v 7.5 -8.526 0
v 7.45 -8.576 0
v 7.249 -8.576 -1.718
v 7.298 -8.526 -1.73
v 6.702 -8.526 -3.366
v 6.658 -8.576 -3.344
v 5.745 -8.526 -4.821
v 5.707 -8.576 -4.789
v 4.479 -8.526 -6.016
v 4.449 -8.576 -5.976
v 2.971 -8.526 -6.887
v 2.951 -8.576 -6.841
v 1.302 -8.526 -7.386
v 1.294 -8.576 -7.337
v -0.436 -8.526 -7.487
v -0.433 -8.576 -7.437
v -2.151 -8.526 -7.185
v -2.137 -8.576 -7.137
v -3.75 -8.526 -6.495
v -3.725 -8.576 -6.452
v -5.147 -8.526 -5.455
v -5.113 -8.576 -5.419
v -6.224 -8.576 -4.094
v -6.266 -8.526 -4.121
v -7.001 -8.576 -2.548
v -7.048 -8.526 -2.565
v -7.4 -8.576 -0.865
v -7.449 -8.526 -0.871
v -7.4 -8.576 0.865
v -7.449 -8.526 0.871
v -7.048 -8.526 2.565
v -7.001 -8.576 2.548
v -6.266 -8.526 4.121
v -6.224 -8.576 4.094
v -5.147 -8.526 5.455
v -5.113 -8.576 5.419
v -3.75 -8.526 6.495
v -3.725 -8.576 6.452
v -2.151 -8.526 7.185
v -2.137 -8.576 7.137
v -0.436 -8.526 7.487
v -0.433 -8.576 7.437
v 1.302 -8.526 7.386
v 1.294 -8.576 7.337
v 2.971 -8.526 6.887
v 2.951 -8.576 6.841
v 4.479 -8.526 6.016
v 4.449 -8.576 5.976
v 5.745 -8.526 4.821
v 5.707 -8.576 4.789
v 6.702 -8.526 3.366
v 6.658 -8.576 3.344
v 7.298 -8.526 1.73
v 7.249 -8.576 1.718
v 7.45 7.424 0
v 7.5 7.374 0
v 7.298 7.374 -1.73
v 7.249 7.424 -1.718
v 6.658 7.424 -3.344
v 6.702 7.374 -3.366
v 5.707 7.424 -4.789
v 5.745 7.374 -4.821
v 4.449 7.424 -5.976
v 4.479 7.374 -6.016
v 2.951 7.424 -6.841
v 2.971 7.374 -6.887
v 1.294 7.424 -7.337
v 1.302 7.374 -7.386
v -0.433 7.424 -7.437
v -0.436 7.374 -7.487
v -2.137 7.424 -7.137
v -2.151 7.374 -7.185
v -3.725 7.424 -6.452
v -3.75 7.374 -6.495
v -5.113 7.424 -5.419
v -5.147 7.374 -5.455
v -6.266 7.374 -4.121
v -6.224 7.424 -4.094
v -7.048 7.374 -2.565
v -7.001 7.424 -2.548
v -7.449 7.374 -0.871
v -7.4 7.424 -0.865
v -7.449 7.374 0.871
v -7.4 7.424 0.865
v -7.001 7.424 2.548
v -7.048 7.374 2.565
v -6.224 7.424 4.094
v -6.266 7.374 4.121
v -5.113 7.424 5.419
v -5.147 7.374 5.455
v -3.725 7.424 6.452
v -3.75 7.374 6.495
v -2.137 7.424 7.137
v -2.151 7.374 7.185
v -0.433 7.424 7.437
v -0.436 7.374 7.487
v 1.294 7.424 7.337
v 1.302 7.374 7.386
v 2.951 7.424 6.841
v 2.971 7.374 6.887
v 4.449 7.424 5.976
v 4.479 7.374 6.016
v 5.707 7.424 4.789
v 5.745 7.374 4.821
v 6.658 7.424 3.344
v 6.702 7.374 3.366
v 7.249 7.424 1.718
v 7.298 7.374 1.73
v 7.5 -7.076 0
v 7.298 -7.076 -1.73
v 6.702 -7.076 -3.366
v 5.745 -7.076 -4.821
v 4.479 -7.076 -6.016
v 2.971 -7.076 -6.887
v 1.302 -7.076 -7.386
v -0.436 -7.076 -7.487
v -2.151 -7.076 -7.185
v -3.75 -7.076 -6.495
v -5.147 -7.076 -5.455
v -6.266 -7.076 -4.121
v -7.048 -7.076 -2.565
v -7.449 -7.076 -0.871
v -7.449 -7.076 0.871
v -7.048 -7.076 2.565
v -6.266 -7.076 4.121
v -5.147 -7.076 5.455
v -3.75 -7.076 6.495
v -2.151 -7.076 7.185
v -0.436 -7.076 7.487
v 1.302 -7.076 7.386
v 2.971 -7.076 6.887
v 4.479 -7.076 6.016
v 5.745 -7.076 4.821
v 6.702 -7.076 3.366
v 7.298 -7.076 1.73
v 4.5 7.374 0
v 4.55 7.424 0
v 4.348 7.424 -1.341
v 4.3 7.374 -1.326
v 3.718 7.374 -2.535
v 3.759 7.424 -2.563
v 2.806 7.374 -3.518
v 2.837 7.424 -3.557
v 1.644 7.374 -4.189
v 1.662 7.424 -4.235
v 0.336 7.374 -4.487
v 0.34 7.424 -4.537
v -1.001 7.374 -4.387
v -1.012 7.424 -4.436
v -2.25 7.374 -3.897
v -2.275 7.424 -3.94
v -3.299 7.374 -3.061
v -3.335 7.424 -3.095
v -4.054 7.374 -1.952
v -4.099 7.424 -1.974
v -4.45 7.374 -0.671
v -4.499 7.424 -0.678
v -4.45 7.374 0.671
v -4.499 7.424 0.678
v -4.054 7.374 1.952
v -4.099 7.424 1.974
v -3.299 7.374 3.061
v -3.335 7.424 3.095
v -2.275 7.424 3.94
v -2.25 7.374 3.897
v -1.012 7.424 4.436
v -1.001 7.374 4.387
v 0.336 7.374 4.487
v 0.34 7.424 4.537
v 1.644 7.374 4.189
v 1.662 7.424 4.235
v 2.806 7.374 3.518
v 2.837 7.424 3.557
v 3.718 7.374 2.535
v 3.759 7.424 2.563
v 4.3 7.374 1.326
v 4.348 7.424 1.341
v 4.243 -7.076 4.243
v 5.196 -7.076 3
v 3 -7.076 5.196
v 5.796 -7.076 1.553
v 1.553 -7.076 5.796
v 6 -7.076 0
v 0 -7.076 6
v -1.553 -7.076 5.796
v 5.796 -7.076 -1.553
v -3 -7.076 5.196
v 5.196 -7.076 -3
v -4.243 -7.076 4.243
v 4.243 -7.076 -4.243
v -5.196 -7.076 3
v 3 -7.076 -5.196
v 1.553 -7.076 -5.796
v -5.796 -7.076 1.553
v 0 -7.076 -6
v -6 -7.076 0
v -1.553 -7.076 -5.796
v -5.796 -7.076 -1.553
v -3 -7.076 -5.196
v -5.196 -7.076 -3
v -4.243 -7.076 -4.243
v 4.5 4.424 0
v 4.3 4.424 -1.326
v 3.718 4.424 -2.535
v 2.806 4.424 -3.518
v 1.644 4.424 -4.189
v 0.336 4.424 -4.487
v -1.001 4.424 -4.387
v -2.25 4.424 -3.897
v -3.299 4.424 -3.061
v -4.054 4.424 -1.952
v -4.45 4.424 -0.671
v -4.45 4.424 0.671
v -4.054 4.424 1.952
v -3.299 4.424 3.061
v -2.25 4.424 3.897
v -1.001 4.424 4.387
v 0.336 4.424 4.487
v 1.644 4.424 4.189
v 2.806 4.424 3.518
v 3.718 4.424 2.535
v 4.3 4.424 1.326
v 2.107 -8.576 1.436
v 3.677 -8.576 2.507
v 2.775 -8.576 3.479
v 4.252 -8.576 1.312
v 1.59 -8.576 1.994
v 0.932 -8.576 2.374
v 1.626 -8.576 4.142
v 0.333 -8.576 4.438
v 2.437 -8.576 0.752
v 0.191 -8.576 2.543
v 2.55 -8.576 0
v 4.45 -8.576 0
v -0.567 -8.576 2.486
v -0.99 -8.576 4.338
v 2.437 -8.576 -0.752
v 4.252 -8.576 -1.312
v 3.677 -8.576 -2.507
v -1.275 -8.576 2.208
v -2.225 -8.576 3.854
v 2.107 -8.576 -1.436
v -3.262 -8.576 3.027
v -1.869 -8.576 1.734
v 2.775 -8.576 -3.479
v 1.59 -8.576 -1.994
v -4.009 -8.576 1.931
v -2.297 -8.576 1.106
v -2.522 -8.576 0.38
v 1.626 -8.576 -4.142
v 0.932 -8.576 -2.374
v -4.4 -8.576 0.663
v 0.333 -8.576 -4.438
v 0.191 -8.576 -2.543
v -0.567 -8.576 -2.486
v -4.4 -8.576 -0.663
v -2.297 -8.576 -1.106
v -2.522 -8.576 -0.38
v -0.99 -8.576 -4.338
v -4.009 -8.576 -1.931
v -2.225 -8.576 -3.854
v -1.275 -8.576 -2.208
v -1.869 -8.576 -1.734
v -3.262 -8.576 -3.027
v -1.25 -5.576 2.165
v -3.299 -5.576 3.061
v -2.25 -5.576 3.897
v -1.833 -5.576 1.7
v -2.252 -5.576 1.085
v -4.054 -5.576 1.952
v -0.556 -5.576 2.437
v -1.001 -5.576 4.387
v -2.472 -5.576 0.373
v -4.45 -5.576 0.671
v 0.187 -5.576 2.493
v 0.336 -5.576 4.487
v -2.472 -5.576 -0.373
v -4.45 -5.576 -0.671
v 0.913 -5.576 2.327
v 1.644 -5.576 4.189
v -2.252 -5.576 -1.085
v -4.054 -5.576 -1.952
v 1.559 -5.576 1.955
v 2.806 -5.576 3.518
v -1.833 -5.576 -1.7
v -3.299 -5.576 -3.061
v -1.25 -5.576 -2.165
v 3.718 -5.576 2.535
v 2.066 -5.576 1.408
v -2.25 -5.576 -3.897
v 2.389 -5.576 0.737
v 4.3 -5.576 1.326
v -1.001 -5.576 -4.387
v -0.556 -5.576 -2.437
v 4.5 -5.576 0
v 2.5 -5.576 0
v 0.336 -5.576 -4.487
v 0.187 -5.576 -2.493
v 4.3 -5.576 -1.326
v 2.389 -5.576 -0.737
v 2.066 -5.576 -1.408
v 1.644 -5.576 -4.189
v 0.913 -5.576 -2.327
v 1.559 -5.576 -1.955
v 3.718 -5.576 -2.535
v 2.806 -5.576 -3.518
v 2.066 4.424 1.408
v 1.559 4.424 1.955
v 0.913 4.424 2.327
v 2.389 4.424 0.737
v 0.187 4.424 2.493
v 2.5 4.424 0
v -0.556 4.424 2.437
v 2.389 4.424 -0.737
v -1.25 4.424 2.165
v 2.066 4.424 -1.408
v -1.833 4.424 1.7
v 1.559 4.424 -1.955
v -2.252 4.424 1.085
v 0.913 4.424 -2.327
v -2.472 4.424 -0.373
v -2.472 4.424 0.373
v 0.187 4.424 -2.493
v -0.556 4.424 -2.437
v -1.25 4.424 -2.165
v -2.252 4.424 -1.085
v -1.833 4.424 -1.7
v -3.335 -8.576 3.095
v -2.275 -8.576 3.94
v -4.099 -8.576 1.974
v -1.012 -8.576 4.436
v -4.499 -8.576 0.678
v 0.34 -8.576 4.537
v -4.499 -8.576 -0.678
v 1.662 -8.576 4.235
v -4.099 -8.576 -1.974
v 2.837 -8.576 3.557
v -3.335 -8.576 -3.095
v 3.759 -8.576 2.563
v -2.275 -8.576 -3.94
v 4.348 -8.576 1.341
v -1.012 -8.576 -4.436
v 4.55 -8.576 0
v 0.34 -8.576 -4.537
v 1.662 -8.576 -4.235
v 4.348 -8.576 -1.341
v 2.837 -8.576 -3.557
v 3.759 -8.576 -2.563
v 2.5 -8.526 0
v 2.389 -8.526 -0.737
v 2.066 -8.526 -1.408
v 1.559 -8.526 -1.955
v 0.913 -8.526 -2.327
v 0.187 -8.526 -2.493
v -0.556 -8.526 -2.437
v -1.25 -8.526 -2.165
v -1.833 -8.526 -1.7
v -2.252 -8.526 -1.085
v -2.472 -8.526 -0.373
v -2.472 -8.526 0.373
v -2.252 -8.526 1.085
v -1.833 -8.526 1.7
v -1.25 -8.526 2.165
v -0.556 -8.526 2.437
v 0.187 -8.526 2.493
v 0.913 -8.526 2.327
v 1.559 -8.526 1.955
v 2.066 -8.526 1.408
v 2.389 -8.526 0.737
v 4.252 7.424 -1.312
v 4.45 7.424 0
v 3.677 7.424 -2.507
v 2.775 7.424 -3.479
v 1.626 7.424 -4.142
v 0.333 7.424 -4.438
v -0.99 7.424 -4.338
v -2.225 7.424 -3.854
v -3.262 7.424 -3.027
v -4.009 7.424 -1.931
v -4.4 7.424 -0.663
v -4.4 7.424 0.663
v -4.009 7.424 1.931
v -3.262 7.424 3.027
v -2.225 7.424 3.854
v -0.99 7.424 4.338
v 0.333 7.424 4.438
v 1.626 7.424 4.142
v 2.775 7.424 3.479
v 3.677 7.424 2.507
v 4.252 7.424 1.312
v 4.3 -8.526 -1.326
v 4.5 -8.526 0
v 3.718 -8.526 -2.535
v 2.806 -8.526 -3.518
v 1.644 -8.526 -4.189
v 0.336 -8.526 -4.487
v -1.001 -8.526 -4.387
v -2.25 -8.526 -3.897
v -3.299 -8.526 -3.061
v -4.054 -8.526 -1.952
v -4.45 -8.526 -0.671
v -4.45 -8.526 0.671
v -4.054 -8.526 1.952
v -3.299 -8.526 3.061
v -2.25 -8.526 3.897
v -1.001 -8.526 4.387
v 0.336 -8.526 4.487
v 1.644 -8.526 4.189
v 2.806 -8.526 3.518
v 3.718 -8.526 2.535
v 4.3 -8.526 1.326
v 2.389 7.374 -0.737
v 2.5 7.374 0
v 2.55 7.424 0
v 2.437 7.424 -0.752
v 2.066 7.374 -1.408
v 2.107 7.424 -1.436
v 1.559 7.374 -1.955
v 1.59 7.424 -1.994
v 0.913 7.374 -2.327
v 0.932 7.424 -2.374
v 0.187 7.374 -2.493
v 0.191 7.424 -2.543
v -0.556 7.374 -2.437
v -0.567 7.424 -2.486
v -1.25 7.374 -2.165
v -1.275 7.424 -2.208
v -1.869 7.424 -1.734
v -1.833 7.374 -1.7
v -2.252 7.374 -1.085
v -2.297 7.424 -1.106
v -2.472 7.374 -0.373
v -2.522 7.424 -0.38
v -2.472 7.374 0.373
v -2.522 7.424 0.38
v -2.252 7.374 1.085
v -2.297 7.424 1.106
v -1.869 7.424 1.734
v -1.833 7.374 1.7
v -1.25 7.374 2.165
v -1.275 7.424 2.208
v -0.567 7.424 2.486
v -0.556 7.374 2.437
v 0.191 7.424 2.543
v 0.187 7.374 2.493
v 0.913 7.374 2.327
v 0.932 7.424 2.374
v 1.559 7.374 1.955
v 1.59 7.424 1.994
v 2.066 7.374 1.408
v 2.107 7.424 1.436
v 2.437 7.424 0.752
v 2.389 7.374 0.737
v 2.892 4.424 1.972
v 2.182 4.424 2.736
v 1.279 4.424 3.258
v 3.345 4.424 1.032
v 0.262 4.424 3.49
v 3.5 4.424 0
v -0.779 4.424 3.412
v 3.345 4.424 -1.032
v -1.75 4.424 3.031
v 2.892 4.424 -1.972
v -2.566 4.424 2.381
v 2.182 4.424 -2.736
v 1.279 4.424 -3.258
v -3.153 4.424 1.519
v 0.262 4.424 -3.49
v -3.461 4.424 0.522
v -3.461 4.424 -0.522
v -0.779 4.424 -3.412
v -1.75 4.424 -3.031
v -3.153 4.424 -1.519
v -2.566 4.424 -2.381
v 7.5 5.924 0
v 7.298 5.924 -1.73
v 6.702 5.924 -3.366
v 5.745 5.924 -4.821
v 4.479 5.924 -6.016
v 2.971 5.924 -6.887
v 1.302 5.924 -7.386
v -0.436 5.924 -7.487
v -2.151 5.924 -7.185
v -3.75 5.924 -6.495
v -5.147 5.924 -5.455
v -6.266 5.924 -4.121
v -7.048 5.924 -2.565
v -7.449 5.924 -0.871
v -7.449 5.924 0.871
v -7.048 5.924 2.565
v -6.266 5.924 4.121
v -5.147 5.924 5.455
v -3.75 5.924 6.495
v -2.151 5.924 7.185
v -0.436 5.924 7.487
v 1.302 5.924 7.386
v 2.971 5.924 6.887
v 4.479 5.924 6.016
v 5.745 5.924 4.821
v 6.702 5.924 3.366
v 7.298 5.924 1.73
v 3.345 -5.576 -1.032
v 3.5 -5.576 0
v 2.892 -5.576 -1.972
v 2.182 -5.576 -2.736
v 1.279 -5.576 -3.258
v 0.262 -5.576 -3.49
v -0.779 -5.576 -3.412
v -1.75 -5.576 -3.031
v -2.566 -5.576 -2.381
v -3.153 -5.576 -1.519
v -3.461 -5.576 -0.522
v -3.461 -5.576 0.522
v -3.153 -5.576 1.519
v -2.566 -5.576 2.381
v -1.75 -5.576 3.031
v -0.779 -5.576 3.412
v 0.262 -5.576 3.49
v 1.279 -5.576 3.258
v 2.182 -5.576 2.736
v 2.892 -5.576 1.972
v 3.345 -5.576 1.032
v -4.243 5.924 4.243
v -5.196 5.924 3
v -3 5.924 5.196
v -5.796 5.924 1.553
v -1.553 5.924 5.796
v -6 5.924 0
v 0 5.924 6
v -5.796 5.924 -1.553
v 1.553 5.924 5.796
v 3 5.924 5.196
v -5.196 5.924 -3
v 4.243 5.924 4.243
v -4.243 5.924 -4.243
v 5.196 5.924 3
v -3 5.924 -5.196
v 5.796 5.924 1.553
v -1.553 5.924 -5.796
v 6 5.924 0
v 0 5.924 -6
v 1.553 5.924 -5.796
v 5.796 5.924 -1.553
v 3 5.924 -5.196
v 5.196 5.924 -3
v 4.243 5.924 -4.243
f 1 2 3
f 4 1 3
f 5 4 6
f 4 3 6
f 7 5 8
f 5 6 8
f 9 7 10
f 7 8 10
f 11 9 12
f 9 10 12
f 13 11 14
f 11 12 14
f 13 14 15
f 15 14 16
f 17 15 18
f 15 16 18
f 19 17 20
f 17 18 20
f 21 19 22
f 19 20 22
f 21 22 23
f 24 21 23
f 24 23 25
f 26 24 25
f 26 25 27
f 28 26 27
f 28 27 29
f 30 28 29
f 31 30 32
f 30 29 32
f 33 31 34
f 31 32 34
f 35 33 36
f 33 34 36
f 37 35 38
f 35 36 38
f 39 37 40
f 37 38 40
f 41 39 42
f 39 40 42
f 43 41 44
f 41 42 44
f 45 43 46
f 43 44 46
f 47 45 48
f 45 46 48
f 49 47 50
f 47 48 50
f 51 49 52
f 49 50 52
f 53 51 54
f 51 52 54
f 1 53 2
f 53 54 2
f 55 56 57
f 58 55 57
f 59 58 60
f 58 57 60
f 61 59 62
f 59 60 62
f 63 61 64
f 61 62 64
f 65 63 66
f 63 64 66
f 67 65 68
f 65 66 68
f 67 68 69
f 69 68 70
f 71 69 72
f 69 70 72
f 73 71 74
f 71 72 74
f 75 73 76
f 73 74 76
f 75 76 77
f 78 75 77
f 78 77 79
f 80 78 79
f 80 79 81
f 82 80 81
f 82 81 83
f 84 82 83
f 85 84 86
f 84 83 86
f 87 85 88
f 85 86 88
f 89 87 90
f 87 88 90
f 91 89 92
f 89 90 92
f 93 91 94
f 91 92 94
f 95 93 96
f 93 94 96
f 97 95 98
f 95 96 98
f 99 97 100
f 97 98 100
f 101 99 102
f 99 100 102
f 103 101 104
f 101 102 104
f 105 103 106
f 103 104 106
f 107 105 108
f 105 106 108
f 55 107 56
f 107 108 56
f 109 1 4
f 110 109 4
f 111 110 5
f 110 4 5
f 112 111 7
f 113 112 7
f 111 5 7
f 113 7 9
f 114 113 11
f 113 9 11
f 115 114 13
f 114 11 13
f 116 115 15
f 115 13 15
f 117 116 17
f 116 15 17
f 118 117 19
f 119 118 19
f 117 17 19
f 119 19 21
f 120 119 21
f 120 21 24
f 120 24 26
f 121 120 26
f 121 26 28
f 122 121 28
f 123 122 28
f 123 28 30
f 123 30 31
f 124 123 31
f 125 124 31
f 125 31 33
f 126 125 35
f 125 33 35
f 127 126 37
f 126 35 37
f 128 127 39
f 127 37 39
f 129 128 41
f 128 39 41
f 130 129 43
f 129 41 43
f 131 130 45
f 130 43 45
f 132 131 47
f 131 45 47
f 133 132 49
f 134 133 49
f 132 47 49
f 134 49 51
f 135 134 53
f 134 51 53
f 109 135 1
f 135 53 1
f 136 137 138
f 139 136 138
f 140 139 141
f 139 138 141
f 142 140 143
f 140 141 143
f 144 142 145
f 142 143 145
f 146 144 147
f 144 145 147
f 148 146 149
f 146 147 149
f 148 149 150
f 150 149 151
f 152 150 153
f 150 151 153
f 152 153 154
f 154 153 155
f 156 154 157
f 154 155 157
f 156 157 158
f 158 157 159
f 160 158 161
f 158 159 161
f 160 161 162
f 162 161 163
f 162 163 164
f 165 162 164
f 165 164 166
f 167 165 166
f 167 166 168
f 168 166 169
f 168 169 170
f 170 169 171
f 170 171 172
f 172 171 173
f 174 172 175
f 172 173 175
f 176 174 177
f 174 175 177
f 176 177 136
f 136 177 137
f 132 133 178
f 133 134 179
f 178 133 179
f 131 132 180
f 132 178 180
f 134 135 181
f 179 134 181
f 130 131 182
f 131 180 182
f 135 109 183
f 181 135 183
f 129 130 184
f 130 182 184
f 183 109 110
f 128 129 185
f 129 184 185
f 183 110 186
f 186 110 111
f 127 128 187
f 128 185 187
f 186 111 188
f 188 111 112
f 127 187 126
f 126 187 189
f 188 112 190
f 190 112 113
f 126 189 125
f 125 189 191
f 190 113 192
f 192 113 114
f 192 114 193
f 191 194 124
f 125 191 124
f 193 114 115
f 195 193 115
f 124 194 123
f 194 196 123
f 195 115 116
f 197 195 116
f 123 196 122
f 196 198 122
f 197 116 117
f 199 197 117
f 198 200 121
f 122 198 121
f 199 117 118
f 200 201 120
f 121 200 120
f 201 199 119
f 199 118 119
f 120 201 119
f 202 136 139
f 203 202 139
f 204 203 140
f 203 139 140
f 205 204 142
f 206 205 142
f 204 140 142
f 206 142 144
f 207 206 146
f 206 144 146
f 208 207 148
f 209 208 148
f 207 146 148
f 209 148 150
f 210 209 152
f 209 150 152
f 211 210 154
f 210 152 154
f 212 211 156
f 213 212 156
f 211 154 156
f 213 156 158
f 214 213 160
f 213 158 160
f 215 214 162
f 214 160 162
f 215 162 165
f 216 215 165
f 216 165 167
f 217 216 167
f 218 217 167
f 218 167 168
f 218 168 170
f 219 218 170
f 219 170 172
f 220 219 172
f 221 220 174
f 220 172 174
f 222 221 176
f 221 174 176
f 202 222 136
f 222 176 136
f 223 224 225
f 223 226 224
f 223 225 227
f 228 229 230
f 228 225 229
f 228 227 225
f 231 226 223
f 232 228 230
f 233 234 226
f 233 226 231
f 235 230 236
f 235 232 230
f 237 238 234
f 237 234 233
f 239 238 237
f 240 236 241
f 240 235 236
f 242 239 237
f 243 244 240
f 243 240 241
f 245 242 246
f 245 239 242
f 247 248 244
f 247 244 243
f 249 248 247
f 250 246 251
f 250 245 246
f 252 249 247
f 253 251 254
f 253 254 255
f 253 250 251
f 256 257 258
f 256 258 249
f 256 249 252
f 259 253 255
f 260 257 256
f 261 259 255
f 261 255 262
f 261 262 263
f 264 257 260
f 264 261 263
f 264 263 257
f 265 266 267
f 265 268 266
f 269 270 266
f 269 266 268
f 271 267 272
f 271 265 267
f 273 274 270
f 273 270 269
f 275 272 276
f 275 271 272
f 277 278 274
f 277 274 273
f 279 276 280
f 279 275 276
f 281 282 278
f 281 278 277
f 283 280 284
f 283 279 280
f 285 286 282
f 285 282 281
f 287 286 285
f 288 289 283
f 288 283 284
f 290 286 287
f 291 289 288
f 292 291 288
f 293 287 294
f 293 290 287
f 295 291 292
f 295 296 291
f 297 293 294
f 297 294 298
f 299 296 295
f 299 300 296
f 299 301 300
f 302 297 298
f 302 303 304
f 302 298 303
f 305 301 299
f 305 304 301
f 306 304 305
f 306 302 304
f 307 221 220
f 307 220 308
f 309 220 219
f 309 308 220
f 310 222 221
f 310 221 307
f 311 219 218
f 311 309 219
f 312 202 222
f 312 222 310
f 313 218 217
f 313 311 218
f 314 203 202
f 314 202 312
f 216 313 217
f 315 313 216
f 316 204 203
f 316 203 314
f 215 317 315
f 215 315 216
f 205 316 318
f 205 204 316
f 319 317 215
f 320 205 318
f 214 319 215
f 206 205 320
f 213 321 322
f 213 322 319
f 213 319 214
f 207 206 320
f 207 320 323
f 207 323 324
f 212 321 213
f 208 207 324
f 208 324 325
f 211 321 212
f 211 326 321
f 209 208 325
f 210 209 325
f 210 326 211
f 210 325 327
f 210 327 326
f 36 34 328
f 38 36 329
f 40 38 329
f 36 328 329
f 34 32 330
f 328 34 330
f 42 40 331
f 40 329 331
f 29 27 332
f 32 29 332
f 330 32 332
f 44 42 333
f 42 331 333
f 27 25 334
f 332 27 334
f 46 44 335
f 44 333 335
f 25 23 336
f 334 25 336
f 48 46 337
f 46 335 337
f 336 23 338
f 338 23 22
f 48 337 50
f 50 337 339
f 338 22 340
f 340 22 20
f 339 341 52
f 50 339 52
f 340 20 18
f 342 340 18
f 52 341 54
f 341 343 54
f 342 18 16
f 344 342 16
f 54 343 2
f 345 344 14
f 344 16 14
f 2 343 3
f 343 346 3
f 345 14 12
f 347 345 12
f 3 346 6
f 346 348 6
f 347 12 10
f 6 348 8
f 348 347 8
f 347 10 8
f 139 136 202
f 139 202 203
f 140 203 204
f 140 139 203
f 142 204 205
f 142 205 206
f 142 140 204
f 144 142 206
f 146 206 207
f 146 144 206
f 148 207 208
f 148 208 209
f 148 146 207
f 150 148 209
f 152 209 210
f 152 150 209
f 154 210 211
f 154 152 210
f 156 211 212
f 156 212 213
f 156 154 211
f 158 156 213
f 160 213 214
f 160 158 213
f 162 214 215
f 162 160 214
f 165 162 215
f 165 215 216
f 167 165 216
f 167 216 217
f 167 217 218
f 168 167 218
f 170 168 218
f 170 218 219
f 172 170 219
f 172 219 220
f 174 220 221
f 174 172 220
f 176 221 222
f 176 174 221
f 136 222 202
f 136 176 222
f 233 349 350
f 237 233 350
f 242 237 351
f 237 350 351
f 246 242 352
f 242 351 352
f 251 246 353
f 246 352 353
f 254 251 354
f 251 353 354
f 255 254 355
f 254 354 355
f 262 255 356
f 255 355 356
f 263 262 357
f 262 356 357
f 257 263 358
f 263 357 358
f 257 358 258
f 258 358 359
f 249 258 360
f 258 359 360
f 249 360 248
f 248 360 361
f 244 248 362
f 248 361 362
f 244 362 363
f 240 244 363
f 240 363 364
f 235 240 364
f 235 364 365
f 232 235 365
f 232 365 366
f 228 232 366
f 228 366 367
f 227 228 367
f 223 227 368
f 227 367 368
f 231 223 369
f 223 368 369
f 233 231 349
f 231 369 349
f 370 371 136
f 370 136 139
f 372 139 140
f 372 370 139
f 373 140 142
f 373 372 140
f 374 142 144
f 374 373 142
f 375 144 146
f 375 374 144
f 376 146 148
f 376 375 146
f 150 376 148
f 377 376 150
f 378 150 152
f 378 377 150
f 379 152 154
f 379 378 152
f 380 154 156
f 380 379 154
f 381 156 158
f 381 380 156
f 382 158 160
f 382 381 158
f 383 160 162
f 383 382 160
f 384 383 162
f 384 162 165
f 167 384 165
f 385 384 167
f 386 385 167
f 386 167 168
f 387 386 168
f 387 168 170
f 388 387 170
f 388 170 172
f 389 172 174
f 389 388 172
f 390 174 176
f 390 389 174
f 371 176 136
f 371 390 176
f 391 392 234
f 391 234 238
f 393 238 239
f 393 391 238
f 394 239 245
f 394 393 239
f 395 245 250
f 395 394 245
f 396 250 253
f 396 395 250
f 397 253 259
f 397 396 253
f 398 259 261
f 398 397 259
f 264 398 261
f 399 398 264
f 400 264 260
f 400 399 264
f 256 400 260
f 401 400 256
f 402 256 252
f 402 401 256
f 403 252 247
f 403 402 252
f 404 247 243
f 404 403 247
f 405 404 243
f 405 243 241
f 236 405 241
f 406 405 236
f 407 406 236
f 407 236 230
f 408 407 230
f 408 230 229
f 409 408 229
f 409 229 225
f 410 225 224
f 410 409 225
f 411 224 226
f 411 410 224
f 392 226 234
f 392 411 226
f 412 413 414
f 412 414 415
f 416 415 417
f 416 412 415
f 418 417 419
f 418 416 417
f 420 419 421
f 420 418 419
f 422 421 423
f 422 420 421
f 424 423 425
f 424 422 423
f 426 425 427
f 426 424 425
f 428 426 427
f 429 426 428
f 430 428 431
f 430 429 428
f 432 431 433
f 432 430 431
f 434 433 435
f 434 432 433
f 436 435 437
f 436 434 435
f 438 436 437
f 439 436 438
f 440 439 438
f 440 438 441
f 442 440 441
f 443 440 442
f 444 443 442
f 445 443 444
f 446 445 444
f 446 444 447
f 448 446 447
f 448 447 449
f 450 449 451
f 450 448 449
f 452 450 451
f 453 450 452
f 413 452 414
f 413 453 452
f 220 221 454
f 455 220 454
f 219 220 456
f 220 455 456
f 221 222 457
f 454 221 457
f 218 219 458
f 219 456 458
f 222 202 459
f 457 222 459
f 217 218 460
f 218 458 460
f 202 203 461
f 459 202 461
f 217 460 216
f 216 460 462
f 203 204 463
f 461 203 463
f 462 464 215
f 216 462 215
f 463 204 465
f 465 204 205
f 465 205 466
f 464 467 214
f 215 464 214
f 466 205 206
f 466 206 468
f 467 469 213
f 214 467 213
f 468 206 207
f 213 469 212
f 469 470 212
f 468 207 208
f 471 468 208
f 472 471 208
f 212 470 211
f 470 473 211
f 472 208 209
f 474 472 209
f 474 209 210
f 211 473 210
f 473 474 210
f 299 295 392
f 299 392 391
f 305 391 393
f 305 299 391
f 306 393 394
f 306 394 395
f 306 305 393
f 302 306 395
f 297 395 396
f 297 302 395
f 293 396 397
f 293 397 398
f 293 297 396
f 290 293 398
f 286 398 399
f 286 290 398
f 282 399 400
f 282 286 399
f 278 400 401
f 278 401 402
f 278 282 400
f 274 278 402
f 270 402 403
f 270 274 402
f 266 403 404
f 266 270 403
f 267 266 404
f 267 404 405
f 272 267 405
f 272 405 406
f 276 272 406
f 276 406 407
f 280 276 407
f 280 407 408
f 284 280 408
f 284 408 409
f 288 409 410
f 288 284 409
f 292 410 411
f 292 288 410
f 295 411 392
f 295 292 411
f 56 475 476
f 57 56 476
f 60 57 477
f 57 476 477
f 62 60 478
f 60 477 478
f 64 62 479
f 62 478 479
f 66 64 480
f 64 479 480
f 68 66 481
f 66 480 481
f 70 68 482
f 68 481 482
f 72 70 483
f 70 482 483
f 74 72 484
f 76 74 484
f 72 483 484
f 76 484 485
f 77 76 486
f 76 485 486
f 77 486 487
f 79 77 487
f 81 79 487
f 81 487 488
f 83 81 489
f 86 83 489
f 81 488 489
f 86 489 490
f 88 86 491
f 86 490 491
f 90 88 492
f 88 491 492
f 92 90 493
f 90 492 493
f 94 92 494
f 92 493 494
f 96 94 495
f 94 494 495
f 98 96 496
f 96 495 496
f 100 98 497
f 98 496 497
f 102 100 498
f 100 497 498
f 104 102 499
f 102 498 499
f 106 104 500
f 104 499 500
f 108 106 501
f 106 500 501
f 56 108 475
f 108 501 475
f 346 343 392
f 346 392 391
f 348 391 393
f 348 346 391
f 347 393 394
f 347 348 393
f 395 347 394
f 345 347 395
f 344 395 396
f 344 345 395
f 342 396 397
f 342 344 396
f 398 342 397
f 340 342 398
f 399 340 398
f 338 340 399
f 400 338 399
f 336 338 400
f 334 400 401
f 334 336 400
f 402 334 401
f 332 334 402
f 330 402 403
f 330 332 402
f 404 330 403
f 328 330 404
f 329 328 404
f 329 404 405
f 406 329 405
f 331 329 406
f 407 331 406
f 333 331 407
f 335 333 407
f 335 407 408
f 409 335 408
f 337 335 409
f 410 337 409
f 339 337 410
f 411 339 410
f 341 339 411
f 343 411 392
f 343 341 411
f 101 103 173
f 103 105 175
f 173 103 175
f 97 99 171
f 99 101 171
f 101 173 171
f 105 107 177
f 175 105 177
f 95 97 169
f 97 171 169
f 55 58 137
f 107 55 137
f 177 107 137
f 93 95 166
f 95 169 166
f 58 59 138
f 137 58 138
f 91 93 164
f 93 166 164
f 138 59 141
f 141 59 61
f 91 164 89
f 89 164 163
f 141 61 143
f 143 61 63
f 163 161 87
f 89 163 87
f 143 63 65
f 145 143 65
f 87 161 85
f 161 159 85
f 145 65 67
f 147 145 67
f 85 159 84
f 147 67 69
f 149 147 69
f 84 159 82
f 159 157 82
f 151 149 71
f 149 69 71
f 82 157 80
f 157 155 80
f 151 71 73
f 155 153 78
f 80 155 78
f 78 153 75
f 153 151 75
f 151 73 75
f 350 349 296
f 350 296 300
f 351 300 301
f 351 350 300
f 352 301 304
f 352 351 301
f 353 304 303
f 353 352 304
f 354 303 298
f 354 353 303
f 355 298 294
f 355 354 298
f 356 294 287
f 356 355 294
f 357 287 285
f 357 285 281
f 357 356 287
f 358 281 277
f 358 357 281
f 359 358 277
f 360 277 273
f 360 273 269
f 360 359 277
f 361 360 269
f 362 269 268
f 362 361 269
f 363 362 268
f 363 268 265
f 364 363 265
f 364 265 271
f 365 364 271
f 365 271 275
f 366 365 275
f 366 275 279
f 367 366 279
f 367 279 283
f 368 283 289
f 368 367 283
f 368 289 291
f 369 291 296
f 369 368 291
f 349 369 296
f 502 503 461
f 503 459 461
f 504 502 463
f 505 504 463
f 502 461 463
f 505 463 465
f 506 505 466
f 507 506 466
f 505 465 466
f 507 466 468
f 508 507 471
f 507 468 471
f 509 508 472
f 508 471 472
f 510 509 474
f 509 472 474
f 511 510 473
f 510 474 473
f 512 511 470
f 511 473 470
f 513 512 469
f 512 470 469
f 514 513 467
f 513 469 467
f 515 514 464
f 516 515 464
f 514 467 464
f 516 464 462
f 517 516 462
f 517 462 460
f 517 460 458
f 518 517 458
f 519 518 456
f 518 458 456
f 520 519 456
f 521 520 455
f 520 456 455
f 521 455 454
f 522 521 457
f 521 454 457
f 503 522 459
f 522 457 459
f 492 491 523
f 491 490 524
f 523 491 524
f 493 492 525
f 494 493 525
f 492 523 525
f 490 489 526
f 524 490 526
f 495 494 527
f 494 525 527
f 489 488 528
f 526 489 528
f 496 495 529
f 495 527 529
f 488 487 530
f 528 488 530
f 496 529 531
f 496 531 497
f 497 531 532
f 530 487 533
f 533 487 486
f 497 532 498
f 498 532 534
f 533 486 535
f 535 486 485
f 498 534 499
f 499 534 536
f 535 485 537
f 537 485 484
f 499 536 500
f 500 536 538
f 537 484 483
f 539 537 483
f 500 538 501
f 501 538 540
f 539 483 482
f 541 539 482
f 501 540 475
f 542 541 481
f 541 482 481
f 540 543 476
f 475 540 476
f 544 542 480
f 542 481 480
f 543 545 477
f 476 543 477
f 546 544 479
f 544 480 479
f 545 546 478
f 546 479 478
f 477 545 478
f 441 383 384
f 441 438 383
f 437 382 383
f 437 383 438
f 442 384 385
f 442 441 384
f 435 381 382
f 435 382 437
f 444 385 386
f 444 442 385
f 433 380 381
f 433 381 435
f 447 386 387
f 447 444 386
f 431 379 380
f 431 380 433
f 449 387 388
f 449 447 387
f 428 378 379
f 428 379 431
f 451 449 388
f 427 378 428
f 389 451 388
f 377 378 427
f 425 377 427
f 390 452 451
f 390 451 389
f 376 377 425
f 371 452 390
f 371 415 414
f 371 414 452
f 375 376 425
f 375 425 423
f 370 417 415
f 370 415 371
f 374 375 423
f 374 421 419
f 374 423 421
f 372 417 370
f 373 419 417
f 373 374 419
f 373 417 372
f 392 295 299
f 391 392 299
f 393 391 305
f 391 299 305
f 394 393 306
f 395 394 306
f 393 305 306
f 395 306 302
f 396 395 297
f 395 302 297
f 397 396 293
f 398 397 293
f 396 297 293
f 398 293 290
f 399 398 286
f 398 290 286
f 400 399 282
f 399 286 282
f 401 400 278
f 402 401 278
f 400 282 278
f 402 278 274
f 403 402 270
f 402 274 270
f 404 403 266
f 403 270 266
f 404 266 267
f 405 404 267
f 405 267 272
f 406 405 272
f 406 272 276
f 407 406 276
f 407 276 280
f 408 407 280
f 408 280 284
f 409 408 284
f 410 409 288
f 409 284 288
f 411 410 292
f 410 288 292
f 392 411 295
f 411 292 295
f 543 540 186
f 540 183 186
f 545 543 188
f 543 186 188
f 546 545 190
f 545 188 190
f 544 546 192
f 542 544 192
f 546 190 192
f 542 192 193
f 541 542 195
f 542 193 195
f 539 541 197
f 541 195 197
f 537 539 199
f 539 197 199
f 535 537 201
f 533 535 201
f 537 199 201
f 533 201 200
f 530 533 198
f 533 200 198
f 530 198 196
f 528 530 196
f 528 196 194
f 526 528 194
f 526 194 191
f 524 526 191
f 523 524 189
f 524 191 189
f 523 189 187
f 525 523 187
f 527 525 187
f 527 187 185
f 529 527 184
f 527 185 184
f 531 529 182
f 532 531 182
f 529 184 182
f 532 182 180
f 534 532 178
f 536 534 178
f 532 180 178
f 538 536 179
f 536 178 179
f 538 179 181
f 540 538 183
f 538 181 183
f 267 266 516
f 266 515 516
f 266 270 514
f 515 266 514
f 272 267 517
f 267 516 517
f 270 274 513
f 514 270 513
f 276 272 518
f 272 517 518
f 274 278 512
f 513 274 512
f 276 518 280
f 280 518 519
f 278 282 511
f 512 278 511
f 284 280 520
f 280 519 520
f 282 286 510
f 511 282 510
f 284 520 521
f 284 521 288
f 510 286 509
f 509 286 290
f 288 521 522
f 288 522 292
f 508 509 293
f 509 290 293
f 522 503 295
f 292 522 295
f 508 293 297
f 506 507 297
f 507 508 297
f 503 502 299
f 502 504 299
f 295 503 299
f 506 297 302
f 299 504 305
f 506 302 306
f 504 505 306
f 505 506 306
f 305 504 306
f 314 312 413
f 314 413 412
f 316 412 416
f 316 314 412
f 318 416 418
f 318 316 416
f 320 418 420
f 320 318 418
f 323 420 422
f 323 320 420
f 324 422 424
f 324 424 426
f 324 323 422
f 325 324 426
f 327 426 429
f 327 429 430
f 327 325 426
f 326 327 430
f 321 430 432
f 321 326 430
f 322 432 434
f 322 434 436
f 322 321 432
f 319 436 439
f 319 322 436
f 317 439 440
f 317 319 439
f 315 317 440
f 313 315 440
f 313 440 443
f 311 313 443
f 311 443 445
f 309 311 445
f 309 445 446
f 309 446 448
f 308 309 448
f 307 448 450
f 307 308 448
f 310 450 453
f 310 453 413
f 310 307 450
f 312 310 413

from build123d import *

# Parameters (mm, degrees)
CHAMFER1_SIZE = 0.05
SKETCH1_3_W   = 2
SKETCH1_3_H   = 3
CHAMFER2_SIZE = 0.05
CHAMFER3_SIZE = 0.05


with BuildPart() as part:
    # Sketch1 → Revolve1 (revolve)
    with BuildSketch(Plane.XY):
        Polygon((6, -7.075803982), (6, 5.924196018), (7.5, 5.924196018), (7.5, 7.424196018), (4.5, 7.424196018), (4.5, 4.424196018), (3.5, 4.424196018), (3.5, -5.575803982), (4.5, -5.575803982), (4.5, -8.575803982), (7.5, -8.575803982), (7.5, -7.075803982), align=None)
    revolve(axis=Axis((0, -12.88820827, 0), (0, 1, 0)))

    # Chamfer1
    chamfer1_edges = [part.edges().sort_by_distance(p)[0] for p in [
        (-4.5, -8.575803982, 0),
        (-4.5, 7.424196018, 0),
        (-7.5, 7.424196018, 0),
        (-7.5, -8.575803982, 0),
    ]]
    chamfer(chamfer1_edges, length=CHAMFER1_SIZE)


with BuildPart() as body_2:
    # Sketch1<3> → Revolve2 (revolve)
    with BuildSketch(Plane.XY):
        with Locations((3.5, 5.924196018)):
            Rectangle(SKETCH1_3_W, SKETCH1_3_H)
        with Locations((3.5, -7.075803982)):
            Rectangle(SKETCH1_3_W, SKETCH1_3_H)
    revolve(axis=Axis((0, -12.88820827, 0), (0, 1, 0)))

    # Chamfer2
    chamfer2_edges = [body_2.edges().sort_by_distance(p)[0] for p in [
        (-4.5, -8.575803982, 0),
        (-2.5, -8.575803982, 0),
    ]]
    chamfer(chamfer2_edges, length=CHAMFER2_SIZE)

    # Chamfer3
    chamfer3_edges = [body_2.edges().sort_by_distance(p)[0] for p in [
        (-4.5, 7.424196018, 0),
        (-2.5, 7.424196018, 0),
    ]]
    chamfer(chamfer3_edges, length=CHAMFER3_SIZE)


solid = Compound([part.part, body_2.part])
